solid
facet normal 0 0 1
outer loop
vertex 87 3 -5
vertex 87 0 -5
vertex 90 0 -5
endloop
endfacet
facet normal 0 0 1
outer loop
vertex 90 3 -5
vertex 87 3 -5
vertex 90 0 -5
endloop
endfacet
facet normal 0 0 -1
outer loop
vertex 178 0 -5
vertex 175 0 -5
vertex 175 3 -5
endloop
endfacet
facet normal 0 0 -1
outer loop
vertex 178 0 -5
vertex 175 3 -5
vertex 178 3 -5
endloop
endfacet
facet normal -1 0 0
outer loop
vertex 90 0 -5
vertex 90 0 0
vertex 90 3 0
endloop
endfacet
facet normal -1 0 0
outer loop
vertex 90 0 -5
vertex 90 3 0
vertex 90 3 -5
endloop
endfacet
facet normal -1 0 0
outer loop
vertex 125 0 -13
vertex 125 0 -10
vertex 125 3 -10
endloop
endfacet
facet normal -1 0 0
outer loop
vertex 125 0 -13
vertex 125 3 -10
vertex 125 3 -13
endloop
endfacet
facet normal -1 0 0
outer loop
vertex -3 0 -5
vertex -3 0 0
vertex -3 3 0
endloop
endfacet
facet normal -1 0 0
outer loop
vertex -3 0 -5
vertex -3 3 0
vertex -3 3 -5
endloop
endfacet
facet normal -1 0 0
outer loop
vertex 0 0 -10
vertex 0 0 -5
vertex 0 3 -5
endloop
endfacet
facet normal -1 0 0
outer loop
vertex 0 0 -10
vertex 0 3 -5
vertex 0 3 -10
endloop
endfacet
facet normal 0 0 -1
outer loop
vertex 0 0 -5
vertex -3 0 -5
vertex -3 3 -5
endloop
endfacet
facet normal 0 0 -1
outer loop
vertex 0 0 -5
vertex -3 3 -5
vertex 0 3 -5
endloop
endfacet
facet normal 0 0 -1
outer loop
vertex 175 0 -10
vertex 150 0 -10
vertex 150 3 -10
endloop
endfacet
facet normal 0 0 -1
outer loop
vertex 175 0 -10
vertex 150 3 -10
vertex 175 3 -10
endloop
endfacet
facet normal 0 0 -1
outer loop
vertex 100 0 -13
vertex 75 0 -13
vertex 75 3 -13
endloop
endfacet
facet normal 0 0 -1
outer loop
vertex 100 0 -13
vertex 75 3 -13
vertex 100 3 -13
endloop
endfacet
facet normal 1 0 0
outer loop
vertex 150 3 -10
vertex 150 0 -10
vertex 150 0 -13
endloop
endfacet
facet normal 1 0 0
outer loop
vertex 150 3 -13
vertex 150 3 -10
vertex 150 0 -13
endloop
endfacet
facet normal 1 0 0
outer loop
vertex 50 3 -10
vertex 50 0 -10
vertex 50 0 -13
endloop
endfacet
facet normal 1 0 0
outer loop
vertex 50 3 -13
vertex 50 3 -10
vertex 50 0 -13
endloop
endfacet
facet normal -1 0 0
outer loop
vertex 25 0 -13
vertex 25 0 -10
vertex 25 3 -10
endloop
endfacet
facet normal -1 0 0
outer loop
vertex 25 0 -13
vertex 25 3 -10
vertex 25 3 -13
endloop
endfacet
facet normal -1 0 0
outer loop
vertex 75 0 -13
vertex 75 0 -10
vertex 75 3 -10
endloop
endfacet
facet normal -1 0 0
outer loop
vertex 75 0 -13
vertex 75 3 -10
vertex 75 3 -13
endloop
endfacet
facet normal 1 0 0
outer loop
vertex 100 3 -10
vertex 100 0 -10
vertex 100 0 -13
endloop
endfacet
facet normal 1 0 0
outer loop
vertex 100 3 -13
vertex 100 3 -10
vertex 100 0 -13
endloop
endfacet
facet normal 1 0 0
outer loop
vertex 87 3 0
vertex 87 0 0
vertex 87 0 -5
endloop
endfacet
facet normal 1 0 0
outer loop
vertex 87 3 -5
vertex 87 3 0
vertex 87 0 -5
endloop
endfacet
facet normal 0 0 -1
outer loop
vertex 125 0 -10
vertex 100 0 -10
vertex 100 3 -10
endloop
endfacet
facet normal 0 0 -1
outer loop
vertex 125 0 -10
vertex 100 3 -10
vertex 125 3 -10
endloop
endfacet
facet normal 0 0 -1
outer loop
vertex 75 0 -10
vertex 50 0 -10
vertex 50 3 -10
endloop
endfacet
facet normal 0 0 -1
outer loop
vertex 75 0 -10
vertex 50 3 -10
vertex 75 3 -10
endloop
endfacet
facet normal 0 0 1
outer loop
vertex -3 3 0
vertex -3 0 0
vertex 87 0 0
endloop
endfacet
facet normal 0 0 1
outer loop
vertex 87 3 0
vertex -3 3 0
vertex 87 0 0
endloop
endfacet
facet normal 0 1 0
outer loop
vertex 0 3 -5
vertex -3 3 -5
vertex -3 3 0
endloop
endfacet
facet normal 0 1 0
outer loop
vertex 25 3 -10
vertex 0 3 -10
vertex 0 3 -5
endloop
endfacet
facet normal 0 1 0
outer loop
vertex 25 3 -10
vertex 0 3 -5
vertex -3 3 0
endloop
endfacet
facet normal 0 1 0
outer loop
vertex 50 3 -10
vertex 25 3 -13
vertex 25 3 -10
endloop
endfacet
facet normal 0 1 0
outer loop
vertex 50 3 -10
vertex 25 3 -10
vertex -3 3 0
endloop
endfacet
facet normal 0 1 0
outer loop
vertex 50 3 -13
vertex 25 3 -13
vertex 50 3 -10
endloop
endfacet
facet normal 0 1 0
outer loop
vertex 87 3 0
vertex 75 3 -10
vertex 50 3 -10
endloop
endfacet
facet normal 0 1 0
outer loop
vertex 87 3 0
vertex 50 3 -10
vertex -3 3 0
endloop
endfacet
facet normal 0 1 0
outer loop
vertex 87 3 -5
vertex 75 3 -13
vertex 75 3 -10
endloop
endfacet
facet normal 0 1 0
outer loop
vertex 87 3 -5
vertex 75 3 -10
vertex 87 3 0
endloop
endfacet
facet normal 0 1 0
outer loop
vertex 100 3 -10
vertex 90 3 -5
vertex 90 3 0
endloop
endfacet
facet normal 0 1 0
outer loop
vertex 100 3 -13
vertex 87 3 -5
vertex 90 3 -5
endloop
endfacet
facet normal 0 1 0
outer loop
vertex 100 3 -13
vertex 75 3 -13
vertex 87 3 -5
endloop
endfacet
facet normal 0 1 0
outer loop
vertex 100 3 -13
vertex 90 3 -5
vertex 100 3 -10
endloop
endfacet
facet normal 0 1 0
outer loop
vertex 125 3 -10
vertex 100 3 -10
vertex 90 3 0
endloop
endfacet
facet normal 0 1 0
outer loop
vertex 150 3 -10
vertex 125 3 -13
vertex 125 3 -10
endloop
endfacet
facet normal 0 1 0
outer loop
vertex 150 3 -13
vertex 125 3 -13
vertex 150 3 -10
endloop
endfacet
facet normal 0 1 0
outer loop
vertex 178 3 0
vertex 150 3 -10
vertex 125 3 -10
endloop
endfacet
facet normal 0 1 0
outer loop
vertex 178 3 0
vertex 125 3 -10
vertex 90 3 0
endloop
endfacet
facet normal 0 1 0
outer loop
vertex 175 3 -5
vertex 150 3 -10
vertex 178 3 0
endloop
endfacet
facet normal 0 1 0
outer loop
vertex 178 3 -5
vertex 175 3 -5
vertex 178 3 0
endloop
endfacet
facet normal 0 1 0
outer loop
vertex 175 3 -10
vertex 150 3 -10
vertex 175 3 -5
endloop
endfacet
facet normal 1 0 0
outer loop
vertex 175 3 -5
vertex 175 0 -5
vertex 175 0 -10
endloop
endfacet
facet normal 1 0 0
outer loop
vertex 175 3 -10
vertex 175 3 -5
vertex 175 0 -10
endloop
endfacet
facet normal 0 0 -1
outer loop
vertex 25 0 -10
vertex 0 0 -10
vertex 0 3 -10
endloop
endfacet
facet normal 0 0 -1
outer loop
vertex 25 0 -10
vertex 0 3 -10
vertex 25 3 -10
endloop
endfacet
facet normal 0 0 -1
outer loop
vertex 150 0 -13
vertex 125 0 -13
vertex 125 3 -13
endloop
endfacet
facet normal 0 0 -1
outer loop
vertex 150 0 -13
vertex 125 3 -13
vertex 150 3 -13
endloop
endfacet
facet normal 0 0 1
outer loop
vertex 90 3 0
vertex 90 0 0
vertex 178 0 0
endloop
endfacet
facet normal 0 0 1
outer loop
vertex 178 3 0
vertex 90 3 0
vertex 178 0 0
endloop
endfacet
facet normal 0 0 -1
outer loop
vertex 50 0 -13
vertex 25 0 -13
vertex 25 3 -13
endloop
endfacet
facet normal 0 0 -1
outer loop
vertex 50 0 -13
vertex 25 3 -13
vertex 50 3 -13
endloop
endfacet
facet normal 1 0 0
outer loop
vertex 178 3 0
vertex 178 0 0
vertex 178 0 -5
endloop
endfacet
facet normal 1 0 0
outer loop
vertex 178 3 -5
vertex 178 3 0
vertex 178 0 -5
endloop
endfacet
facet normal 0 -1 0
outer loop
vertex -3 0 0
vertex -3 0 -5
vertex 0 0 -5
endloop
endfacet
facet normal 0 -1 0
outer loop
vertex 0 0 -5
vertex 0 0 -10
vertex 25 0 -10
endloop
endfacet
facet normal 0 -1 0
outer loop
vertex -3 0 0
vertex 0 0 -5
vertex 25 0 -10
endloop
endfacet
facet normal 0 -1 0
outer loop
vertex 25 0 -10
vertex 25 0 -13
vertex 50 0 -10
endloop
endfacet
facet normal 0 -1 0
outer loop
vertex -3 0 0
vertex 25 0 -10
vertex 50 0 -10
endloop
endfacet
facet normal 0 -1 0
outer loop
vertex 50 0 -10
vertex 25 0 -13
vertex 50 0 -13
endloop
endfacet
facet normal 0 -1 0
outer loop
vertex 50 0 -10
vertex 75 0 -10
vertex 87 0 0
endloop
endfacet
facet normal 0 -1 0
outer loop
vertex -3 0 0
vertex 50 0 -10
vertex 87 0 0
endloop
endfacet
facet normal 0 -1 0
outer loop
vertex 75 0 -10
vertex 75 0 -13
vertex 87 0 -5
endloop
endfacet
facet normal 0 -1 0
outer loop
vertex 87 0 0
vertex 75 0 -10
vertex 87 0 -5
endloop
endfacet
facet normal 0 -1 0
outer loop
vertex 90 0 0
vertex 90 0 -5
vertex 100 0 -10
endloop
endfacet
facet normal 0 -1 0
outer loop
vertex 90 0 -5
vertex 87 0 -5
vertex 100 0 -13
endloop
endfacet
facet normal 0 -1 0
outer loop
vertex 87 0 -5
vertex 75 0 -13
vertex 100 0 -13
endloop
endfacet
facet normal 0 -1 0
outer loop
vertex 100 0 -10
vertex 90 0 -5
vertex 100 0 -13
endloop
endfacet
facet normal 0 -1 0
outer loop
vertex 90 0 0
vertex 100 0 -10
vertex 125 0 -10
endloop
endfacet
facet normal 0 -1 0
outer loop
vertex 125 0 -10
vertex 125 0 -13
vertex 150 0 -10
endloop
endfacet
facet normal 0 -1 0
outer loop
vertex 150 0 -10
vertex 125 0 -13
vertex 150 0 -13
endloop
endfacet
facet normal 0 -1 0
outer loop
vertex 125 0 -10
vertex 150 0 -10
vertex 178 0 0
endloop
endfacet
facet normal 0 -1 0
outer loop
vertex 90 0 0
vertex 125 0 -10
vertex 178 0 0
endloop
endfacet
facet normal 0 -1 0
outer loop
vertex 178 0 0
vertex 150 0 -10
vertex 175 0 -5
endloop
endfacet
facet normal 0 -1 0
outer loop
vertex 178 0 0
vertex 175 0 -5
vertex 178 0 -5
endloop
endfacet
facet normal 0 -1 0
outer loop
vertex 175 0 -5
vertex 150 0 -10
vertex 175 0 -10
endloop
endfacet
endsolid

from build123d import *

# Parameters (mm, degrees)
SKICA1_W                 = 175
SKICA1_H                 = 10
P_IDAT_VYSUNUT_M1_DEPTH  = 3
SKICA2_W                 = 3
SKICA2_H                 = 5
SKICA2_W_2               = 25
SKICA2_H_2               = 3
P_IDAT_VYSUNUT_M2_DEPTH  = 3
SKICA3_W                 = 3
SKICA3_H                 = 5
ODEBRAT_VYSUNUT_M1_DEPTH = 179.499299719


with BuildPart() as part:
    # Skica1 → Přidat vysunutím1 (new body)
    with BuildSketch(Plane(origin=(0, 0, 0), x_dir=(1, 0, 0), z_dir=(0, 1, 0))):
        with Locations((87.5, 5)):
            Rectangle(SKICA1_W, SKICA1_H)
    extrude(amount=P_IDAT_VYSUNUT_M1_DEPTH)

    # Skica2 → Přidat vysunutím2 (add)
    with BuildSketch(Plane(origin=(0, 0, 0), x_dir=(1, 0, 0), z_dir=(0, 1, 0))):
        with Locations((-1.5, 2.5)):
            Rectangle(SKICA2_W, SKICA2_H)
        with Locations((176.5, 2.5)):
            Rectangle(SKICA2_W, SKICA2_H)
        with Locations((37.5, 11.5)):
            Rectangle(SKICA2_W_2, SKICA2_H_2)
        with Locations((87.5, 11.5)):
            Rectangle(SKICA2_W_2, SKICA2_H_2)
        with Locations((137.5, 11.5)):
            Rectangle(SKICA2_W_2, SKICA2_H_2)
    extrude(amount=P_IDAT_VYSUNUT_M2_DEPTH)

    # Skica3 → Odebrat vysunutím1 (cut, through all)
    with BuildSketch(Plane(origin=(0, 0, 0), x_dir=(1, 0, 0), z_dir=(0, 1, 0))):
        with Locations((88.5, 2.5)):
            Rectangle(SKICA3_W, SKICA3_H)
    extrude(amount=ODEBRAT_VYSUNUT_M1_DEPTH, mode=Mode.SUBTRACT)


solid = part.part
